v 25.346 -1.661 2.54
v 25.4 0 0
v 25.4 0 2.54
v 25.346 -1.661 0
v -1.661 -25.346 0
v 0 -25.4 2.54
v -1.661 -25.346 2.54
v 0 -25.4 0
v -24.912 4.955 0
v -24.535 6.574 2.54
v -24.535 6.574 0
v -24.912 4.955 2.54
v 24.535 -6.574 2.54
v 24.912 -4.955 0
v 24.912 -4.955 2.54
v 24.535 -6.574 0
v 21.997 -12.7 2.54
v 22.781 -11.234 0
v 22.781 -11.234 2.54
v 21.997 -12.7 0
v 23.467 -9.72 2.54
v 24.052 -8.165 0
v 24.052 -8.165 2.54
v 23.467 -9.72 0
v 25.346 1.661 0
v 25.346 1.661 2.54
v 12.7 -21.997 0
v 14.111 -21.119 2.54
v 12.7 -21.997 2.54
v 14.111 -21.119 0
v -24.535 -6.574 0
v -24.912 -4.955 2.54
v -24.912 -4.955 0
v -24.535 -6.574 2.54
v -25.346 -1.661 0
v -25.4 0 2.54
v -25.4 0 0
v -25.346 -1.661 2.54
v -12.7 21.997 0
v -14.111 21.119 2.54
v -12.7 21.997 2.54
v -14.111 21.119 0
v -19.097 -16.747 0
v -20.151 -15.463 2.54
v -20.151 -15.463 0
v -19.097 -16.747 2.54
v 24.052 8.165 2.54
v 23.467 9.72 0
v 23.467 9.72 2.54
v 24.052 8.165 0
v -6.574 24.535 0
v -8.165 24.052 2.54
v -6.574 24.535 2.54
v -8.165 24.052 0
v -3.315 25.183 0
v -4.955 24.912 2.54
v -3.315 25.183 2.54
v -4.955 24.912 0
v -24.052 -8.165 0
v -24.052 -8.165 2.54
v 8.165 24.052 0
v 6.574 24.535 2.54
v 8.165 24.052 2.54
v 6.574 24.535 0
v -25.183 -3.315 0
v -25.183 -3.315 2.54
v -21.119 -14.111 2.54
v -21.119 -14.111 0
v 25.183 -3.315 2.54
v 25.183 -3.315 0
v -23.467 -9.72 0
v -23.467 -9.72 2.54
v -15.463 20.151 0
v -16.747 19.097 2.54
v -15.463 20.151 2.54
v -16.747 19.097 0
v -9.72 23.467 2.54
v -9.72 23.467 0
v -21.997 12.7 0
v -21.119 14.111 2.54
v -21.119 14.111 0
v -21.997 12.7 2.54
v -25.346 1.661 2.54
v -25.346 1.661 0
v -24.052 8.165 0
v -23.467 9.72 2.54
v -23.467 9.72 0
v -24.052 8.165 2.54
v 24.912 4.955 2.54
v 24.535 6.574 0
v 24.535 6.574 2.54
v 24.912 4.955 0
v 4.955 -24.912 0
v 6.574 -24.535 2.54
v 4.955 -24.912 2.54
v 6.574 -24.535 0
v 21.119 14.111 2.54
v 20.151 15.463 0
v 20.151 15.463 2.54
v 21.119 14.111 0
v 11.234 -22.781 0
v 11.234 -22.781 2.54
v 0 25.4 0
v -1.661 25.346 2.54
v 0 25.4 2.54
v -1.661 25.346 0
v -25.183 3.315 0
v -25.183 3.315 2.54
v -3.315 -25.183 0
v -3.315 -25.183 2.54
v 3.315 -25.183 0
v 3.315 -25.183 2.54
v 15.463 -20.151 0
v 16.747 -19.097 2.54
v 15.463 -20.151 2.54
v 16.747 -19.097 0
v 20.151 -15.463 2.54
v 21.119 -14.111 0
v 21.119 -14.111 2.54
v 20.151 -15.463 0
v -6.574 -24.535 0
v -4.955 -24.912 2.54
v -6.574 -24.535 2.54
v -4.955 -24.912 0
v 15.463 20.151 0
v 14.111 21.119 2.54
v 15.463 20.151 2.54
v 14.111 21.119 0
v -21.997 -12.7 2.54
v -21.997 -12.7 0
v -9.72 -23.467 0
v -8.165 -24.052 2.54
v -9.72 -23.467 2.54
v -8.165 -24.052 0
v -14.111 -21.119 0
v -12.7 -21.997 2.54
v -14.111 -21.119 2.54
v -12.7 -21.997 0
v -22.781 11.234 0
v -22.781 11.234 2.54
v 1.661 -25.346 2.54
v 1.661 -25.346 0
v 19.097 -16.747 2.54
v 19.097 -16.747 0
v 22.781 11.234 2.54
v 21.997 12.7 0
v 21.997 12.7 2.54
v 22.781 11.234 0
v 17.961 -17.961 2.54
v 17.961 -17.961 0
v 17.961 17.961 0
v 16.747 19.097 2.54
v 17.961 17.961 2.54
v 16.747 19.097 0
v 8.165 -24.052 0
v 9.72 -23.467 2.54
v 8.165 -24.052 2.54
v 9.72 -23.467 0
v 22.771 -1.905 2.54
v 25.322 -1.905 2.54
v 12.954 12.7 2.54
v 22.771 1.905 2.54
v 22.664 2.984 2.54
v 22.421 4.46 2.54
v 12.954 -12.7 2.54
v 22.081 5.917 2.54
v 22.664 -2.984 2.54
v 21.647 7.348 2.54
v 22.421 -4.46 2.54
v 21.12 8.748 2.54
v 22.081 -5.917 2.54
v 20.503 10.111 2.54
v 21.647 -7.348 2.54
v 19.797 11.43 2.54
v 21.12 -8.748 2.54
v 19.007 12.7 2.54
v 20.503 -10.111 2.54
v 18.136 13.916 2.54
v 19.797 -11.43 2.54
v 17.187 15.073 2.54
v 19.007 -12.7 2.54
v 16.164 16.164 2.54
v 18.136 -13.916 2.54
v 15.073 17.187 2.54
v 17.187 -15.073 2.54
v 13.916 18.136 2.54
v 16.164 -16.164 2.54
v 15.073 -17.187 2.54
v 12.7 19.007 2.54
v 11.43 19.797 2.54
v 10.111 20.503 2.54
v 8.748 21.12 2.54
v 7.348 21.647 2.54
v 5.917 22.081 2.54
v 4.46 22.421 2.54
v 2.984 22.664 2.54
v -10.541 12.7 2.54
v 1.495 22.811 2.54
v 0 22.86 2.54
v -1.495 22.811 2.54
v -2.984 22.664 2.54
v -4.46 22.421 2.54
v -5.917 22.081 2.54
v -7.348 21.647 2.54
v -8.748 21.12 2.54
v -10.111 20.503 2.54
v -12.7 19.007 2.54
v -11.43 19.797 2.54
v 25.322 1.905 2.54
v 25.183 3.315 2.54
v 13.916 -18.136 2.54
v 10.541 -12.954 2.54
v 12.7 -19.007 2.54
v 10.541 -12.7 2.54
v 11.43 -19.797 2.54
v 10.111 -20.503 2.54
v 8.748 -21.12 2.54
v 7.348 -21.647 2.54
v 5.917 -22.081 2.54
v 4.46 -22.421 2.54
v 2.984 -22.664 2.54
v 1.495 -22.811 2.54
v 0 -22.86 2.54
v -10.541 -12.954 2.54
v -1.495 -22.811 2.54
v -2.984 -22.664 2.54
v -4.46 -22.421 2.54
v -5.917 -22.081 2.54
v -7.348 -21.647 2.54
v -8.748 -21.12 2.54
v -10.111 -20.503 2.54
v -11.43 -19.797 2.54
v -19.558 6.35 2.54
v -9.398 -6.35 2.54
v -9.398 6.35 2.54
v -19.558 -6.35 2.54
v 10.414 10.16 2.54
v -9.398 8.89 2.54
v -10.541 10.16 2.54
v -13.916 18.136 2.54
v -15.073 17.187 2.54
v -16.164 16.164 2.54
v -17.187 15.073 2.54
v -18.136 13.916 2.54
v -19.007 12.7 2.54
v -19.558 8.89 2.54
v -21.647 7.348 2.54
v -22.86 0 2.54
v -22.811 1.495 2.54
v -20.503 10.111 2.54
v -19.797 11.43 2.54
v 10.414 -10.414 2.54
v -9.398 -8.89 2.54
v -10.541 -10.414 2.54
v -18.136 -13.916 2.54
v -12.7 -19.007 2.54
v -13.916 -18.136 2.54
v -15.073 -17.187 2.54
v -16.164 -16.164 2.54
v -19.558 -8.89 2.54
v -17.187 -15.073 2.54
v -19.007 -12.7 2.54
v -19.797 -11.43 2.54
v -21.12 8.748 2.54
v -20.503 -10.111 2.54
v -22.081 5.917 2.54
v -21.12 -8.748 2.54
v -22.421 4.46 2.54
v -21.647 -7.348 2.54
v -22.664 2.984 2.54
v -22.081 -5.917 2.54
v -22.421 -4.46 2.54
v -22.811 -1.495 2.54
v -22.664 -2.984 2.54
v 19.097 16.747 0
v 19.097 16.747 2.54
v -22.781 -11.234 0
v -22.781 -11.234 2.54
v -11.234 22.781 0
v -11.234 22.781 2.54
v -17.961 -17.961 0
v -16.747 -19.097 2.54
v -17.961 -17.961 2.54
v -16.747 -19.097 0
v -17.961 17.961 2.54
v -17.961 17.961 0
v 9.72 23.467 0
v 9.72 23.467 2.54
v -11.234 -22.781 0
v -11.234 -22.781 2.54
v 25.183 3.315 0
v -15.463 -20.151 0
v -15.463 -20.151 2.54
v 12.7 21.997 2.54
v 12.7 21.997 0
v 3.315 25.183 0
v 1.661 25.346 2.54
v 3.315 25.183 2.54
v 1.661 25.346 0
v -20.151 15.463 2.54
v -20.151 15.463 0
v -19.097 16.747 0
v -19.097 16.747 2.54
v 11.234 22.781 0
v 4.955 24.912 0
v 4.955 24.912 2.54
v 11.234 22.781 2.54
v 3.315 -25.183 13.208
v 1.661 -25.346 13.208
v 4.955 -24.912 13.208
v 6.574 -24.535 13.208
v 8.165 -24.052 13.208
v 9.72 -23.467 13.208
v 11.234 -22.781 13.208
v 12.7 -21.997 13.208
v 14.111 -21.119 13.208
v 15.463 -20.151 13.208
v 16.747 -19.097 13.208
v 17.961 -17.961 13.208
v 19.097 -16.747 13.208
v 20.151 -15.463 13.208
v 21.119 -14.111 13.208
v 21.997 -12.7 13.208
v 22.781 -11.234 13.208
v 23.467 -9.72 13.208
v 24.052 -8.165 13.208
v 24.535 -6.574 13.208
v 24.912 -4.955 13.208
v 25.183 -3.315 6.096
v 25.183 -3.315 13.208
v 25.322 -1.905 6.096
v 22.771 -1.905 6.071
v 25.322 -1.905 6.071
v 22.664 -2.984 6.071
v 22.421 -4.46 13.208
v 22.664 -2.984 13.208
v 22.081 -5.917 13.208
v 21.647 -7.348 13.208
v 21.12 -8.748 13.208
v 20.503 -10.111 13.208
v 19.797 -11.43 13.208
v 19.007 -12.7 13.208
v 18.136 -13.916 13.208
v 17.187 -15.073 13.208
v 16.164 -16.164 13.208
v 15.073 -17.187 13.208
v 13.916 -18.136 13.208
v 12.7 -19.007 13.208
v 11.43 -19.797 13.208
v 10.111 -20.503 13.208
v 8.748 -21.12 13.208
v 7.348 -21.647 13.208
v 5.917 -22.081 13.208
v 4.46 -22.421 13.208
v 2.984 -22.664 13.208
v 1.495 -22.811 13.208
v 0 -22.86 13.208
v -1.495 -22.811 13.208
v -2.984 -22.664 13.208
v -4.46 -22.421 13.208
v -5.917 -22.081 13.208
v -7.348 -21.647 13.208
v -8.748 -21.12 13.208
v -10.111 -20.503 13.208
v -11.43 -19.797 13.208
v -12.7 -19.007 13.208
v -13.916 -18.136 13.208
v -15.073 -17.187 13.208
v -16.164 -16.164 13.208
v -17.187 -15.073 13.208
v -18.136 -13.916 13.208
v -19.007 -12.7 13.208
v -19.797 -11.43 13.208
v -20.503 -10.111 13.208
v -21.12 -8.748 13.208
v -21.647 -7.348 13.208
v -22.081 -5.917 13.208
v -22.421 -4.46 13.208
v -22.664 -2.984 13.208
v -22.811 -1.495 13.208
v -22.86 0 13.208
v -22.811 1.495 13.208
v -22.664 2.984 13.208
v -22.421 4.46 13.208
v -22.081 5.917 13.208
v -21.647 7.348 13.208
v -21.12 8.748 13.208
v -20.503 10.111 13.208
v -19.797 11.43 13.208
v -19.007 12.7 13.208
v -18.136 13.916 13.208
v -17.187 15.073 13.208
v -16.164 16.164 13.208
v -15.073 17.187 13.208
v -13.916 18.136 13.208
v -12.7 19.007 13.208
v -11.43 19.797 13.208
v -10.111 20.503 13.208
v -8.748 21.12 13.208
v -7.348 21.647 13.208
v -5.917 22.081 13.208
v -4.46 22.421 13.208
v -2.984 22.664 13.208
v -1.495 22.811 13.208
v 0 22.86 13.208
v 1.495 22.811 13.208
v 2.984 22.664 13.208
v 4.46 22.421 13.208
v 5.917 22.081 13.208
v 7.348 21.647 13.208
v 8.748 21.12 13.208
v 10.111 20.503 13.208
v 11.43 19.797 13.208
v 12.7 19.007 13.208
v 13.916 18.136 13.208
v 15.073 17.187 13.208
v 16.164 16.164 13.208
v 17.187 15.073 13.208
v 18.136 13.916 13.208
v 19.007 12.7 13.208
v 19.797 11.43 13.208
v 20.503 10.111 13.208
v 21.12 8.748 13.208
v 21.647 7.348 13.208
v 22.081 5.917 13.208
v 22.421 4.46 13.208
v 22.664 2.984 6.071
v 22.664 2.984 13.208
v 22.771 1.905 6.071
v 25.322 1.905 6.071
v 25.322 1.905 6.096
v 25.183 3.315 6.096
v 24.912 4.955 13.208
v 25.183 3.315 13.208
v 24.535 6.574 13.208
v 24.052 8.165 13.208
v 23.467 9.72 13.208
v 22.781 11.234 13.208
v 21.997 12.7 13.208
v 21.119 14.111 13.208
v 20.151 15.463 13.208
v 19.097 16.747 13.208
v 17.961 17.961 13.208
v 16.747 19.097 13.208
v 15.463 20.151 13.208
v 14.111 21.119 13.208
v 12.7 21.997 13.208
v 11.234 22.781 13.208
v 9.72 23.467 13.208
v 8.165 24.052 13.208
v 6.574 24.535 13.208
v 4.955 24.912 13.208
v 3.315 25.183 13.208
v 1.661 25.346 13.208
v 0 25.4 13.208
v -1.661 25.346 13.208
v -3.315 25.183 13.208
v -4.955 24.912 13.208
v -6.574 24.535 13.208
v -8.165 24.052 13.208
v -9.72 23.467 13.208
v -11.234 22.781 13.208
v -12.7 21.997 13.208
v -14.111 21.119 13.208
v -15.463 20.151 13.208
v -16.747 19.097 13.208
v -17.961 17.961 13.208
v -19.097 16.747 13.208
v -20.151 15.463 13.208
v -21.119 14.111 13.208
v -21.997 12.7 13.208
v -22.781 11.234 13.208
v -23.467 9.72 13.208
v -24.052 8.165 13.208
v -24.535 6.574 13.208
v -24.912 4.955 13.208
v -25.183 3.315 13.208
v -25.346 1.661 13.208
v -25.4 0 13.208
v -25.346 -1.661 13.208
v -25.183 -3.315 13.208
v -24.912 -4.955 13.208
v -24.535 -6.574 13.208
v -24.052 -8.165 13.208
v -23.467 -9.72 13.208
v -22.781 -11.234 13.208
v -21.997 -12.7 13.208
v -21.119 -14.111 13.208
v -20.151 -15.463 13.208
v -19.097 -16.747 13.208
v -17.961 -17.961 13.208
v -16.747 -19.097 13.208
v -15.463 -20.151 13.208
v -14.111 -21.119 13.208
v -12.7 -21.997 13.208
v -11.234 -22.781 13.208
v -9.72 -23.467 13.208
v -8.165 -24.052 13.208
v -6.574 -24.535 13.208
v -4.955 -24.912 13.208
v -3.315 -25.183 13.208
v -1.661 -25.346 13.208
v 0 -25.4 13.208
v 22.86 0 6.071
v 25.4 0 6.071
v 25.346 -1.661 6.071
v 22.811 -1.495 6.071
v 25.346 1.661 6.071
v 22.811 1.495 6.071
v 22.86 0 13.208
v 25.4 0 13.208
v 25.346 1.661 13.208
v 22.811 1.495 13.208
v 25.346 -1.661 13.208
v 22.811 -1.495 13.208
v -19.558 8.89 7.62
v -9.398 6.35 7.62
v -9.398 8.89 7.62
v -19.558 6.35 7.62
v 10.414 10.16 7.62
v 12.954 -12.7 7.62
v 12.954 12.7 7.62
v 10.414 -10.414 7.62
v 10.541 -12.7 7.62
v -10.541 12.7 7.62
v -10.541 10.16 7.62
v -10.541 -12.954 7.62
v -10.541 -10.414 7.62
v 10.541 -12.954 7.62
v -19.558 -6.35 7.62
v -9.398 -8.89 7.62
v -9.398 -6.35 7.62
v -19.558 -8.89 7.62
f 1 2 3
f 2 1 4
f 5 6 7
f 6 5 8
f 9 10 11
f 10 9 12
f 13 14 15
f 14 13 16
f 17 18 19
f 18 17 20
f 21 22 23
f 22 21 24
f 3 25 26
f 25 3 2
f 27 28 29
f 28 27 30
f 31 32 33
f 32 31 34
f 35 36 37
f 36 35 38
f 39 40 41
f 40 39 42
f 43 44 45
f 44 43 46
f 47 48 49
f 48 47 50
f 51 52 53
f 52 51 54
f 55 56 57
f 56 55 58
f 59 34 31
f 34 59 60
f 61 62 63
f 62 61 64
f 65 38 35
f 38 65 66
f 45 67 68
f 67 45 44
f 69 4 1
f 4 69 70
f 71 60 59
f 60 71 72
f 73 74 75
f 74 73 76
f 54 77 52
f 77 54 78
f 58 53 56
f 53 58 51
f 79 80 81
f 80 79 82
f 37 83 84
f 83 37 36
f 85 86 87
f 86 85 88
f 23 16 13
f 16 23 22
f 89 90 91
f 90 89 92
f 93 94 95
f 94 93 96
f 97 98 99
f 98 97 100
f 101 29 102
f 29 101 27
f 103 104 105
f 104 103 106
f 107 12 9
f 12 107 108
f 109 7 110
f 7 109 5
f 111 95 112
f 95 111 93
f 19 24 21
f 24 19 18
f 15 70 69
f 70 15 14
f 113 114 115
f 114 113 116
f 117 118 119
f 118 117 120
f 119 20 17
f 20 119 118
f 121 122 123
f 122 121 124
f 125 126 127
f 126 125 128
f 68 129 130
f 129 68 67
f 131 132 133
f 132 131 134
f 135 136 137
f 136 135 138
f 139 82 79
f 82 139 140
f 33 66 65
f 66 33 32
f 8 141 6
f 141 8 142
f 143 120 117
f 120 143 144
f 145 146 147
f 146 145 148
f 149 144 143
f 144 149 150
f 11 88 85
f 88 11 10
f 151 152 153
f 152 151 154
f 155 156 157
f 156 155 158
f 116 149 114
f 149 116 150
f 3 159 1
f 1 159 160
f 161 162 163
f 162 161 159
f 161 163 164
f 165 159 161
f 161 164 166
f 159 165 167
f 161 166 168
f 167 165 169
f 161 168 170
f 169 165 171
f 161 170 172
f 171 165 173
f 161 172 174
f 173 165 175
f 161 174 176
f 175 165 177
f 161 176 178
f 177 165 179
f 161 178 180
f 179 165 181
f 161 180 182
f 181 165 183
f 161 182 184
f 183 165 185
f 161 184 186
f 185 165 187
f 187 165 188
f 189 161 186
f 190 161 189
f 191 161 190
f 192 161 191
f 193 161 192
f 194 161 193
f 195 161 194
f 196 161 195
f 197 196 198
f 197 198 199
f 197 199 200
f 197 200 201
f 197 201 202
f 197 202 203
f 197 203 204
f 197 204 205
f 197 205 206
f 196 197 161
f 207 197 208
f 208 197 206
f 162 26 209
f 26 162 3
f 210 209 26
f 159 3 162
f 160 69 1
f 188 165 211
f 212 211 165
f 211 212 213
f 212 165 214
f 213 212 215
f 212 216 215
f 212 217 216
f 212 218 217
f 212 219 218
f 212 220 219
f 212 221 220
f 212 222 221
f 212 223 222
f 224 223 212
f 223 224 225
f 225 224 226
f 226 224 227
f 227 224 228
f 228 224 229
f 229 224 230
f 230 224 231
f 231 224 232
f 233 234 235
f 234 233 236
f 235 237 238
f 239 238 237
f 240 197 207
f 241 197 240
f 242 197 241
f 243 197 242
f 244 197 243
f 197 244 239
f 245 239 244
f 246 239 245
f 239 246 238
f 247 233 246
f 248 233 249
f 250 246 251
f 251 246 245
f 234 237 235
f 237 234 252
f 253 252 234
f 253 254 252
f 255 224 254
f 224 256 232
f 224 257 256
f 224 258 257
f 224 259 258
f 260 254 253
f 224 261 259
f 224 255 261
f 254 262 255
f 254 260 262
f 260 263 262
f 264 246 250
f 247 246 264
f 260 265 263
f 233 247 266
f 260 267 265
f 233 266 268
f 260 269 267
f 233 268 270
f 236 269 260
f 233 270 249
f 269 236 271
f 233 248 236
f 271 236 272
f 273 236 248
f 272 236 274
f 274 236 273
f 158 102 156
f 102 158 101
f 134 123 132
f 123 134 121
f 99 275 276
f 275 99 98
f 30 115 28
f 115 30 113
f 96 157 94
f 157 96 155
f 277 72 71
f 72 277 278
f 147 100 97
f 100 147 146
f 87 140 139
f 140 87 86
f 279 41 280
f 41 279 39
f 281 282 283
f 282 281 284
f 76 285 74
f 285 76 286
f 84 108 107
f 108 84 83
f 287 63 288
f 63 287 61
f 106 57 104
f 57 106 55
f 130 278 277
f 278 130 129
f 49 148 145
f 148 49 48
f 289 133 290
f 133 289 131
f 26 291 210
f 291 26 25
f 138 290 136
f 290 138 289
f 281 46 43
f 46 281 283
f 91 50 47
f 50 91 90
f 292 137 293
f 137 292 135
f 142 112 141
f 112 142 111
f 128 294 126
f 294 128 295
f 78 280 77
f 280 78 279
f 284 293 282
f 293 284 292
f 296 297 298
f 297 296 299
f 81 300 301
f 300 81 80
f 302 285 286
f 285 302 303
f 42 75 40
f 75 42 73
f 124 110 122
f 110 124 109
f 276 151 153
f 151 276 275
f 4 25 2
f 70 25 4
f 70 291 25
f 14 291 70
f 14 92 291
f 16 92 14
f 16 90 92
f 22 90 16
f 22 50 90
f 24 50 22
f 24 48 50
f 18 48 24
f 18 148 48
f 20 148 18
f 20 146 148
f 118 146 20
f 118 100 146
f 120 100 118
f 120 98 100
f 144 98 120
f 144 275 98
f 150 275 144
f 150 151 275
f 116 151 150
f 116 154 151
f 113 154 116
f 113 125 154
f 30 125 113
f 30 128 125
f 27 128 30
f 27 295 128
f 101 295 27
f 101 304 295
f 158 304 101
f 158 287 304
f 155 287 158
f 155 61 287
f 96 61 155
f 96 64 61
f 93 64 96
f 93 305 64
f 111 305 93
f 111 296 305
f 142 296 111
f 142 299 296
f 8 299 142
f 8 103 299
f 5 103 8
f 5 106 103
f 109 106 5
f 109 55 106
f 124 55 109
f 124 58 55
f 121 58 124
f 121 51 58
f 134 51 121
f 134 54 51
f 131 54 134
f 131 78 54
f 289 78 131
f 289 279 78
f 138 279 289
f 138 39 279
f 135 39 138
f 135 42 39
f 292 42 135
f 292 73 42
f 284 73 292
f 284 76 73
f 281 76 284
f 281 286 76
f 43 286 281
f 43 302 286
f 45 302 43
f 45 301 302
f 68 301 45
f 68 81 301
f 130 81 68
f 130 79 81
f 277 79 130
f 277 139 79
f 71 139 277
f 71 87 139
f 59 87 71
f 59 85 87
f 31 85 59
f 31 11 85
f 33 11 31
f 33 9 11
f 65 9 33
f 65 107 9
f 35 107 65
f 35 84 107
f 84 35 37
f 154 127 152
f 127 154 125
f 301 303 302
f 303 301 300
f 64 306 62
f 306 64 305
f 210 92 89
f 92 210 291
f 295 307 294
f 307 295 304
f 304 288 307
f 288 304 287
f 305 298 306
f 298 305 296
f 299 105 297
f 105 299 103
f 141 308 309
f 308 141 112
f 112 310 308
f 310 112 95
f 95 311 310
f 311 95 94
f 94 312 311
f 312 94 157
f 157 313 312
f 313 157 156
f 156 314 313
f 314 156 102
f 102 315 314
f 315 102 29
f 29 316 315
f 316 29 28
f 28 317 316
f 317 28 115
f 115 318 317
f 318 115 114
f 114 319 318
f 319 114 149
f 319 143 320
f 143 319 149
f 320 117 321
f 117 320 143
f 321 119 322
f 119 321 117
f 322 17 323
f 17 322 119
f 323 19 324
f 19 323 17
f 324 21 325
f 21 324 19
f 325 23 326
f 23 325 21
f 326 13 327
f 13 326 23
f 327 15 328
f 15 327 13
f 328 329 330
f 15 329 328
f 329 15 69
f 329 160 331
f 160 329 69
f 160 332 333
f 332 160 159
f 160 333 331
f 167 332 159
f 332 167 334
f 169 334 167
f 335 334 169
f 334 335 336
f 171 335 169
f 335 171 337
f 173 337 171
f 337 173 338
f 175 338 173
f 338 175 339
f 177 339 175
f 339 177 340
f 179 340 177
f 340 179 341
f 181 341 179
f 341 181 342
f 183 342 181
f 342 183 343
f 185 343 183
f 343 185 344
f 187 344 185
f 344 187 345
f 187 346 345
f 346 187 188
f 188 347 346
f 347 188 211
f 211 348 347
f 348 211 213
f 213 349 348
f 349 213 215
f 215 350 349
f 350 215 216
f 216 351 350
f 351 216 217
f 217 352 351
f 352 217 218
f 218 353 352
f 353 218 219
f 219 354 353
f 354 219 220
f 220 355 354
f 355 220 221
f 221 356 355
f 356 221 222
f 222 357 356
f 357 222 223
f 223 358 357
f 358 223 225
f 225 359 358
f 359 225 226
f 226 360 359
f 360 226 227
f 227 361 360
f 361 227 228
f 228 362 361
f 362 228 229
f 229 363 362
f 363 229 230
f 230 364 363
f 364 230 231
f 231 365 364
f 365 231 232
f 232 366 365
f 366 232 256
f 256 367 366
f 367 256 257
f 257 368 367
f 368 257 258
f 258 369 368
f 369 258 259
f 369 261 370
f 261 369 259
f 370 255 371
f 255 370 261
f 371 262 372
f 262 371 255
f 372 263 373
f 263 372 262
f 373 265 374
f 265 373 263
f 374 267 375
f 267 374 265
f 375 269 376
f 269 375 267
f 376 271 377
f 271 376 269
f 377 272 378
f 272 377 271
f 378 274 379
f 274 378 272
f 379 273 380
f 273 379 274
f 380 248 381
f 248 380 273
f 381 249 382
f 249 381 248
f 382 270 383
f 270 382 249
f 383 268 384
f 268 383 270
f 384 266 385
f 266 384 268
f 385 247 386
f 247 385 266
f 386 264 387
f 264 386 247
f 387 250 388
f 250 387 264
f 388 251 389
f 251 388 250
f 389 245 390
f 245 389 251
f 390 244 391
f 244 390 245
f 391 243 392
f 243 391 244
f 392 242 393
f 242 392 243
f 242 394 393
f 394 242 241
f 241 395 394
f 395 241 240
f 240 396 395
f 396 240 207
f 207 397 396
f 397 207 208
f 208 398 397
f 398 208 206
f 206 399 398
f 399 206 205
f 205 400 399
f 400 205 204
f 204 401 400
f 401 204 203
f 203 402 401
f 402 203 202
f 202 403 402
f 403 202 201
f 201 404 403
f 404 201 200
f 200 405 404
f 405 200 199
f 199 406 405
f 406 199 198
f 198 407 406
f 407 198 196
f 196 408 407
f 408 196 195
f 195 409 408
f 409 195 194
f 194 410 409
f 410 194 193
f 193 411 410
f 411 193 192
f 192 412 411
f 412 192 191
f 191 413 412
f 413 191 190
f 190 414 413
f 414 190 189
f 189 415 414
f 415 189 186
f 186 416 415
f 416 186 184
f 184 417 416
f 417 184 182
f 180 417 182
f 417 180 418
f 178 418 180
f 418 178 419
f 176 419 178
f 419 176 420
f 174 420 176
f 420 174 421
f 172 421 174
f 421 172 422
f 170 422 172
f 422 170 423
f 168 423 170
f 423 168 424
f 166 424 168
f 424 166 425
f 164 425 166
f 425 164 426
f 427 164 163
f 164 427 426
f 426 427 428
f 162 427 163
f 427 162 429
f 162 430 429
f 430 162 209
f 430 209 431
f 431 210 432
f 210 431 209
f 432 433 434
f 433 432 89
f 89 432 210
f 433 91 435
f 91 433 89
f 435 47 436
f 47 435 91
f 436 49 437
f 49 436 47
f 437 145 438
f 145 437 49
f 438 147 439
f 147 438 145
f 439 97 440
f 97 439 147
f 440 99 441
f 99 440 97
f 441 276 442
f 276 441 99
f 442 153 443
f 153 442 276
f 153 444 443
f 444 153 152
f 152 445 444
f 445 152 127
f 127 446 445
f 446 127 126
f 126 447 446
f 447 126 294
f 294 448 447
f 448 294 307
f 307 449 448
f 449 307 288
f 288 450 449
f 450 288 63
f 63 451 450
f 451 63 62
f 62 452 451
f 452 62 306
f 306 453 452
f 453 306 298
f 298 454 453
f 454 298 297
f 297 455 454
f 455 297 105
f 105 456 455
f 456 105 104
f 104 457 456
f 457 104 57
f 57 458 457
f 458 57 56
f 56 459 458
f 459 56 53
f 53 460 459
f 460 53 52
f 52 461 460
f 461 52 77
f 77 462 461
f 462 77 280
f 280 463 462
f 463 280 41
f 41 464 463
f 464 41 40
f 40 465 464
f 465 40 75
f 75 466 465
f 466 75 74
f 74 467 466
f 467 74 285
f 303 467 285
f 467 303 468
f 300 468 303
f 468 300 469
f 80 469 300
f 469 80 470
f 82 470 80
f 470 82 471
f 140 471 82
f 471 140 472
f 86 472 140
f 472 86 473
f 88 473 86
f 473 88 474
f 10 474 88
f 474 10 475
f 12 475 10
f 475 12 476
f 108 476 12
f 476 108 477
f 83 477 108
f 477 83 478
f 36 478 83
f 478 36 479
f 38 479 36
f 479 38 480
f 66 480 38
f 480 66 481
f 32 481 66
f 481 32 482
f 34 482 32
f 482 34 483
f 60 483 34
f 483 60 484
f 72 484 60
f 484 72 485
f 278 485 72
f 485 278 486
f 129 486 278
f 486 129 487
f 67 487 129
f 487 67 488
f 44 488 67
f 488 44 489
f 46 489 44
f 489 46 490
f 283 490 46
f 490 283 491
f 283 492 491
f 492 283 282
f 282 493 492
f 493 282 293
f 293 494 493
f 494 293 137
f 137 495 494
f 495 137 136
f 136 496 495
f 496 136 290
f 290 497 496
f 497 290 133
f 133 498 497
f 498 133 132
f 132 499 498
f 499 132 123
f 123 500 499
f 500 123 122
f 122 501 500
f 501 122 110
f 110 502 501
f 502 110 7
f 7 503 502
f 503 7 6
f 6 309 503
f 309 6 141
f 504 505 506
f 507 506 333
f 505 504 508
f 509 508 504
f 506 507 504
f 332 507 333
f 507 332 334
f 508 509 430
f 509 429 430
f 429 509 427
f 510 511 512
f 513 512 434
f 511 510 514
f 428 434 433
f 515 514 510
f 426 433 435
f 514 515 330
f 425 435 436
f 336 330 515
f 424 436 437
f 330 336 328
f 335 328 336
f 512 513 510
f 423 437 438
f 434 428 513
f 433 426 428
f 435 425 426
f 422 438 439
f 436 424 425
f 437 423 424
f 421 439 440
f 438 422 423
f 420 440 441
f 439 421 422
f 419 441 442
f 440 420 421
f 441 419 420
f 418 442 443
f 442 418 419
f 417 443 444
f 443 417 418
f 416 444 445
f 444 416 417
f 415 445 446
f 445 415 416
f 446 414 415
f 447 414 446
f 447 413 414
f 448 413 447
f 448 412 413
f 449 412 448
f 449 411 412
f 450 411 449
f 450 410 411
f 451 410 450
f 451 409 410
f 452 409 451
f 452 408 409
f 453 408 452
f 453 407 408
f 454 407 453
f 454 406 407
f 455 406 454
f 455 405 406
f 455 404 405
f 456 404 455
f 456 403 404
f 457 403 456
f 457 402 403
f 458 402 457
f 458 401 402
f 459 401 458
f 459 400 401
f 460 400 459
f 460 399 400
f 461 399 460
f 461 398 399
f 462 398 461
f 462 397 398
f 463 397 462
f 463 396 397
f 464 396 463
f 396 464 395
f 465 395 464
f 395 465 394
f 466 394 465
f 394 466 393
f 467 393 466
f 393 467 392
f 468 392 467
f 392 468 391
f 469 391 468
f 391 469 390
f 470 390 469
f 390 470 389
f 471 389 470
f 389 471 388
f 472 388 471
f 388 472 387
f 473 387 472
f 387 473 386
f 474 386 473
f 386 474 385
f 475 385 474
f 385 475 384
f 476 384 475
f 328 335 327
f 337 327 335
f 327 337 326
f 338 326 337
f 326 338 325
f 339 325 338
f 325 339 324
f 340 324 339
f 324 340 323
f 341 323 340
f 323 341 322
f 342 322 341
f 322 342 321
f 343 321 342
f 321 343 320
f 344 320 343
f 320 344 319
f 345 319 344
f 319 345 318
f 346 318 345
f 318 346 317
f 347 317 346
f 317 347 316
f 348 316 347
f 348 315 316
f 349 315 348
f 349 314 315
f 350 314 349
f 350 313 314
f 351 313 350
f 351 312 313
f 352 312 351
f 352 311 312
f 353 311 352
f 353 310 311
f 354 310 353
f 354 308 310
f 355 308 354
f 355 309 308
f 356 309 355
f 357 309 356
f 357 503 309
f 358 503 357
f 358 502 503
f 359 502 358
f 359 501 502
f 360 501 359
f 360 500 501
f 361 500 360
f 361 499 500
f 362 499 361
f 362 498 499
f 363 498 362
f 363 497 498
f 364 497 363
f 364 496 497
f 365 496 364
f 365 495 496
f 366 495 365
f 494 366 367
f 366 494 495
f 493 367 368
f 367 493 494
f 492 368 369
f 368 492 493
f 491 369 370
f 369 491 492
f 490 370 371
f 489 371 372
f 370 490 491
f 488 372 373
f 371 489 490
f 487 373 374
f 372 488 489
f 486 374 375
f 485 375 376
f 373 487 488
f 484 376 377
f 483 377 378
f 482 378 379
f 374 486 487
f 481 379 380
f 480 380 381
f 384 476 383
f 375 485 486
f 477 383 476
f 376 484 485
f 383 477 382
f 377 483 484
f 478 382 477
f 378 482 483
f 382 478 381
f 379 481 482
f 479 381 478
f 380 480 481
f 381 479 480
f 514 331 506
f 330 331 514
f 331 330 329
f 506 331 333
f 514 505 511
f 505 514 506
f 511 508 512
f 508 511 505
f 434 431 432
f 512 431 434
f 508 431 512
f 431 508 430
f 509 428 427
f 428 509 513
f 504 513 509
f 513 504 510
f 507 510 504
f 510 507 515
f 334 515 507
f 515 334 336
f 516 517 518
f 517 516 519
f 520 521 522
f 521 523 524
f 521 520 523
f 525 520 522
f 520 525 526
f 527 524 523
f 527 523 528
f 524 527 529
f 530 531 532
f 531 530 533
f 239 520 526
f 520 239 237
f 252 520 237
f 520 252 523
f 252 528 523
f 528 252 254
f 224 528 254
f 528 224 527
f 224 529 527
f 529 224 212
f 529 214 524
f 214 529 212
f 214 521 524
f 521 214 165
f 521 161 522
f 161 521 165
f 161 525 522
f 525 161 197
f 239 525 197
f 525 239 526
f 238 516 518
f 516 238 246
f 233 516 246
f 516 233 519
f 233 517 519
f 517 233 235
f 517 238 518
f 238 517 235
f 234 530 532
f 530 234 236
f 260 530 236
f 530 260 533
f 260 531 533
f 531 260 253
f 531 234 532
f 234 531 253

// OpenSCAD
ViewScale = [0.0254, 0.0254, 0.0254];

module arduino()
{
    translate([0, 0, 82+36])
    linear_extrude(60)
    square([794, 760]);

    translate([0, 0, 36])
    linear_extrude(82){
    square([794, 760]);
    translate([156, 760, 0])
    square([486, 430]);
    }
    linear_extrude(36)
    translate([270, 270, 0])
    square([310, 310]);
}


module model_button()
{
    linear_extrude(136)
    square([470, 470], center=true);
    translate([0, 0, 136])
    linear_extrude(30)
    circle(308/2, $fn=96);

    for(jj = [470/2+180/2,-470/2-180/2]) {
        for(ii = [-100,100]) {
            translate([jj, ii, 0])
            linear_extrude(40)
            square([180, 40], center=true);
        }
    }
}

module buttoncase()
{
    *translate([0, 0, 400]) {
        *translate([0, 0, 50])
        color("cyan")
        model_button();

//        *#linear_extrude(50)
//        square([480, 480], center=true);

        //translate([0, 0, 49])
        linear_extrude(120)
        difference() { 
            square([580, 580], center=true);
            square([480, 480], center=true);
            for(ii = [-100,100]) {
                translate([0, ii, 0])
                square([600, 60], center=true);
            }
        }

        *linear_extrude(500, center=true, scale=0.58)
        square([1000, 1000], center=true);
    }

    linear_extrude(100)
    circle(1000, $fn=96);
    
    translate([0, 0, 99]) {
        linear_extrude(141)
        difference() {
            circle(1000, $fn=96);
            circle(900, $fn=96);
            translate([1000, 0, 0])
            square([400, 150], center=true);
        }
    }

//    *translate([0, 0, 49]) {
//        linear_extrude(401)
//        square([480, 480], center=true);
//    }

    translate([0, 0, 239])
    linear_extrude(281)
    difference() {
        circle(1000, $fn=96);
        circle(900, $fn=96);
    }

    linear_extrude(300)
    color("darkgreen") {
        translate([0, 450, 100])
        square([830, 100], center=true);

        translate([-570, 300, 100])
        square([400, 100], center=true);

        translate([0, -460, 100])
        square([830, 100], center=true);

        translate([-570, -300, 100])
        square([400, 100], center=true);

        translate([460, 0, 100])
        square([100, 1000], center=true);
    }

}

module lid()
{
    linear_extrude(70)
    difference() {
        circle(1000, $fn=96);
        square([580, 580], center=true);
    }

    translate([0, 0, -150]) {
        *translate([0, 0, 50])
        color("cyan")
        model_button();
        linear_extrude(50)
        square([480, 480], center=true);

//        *#linear_extrude(50)
//        square([480, 480], center=true);

        //translate([0, 0, 49])
        linear_extrude(220)
        difference() { 
            square([580, 580], center=true);
            square([480, 480], center=true);
            for(ii = [-100,100]) {
                translate([0, ii, 0])
                square([600, 60], center=true);
            }
        }

    }

    translate([0, 0, -150])
    linear_extrude(151)
    difference() {
        circle(890, $fn=96);
        circle(840, $fn=96);
    }

    *translate([0, 0, -100])
    model_button();
}

scale(ViewScale)
{
    buttoncase();
    *translate([0, 0, 1520])
//    color("cornflowerblue")
    lid();
    *color("royalblue")
    translate([400, -400, 100])
    rotate([0, 0, 90])
    arduino();
}
